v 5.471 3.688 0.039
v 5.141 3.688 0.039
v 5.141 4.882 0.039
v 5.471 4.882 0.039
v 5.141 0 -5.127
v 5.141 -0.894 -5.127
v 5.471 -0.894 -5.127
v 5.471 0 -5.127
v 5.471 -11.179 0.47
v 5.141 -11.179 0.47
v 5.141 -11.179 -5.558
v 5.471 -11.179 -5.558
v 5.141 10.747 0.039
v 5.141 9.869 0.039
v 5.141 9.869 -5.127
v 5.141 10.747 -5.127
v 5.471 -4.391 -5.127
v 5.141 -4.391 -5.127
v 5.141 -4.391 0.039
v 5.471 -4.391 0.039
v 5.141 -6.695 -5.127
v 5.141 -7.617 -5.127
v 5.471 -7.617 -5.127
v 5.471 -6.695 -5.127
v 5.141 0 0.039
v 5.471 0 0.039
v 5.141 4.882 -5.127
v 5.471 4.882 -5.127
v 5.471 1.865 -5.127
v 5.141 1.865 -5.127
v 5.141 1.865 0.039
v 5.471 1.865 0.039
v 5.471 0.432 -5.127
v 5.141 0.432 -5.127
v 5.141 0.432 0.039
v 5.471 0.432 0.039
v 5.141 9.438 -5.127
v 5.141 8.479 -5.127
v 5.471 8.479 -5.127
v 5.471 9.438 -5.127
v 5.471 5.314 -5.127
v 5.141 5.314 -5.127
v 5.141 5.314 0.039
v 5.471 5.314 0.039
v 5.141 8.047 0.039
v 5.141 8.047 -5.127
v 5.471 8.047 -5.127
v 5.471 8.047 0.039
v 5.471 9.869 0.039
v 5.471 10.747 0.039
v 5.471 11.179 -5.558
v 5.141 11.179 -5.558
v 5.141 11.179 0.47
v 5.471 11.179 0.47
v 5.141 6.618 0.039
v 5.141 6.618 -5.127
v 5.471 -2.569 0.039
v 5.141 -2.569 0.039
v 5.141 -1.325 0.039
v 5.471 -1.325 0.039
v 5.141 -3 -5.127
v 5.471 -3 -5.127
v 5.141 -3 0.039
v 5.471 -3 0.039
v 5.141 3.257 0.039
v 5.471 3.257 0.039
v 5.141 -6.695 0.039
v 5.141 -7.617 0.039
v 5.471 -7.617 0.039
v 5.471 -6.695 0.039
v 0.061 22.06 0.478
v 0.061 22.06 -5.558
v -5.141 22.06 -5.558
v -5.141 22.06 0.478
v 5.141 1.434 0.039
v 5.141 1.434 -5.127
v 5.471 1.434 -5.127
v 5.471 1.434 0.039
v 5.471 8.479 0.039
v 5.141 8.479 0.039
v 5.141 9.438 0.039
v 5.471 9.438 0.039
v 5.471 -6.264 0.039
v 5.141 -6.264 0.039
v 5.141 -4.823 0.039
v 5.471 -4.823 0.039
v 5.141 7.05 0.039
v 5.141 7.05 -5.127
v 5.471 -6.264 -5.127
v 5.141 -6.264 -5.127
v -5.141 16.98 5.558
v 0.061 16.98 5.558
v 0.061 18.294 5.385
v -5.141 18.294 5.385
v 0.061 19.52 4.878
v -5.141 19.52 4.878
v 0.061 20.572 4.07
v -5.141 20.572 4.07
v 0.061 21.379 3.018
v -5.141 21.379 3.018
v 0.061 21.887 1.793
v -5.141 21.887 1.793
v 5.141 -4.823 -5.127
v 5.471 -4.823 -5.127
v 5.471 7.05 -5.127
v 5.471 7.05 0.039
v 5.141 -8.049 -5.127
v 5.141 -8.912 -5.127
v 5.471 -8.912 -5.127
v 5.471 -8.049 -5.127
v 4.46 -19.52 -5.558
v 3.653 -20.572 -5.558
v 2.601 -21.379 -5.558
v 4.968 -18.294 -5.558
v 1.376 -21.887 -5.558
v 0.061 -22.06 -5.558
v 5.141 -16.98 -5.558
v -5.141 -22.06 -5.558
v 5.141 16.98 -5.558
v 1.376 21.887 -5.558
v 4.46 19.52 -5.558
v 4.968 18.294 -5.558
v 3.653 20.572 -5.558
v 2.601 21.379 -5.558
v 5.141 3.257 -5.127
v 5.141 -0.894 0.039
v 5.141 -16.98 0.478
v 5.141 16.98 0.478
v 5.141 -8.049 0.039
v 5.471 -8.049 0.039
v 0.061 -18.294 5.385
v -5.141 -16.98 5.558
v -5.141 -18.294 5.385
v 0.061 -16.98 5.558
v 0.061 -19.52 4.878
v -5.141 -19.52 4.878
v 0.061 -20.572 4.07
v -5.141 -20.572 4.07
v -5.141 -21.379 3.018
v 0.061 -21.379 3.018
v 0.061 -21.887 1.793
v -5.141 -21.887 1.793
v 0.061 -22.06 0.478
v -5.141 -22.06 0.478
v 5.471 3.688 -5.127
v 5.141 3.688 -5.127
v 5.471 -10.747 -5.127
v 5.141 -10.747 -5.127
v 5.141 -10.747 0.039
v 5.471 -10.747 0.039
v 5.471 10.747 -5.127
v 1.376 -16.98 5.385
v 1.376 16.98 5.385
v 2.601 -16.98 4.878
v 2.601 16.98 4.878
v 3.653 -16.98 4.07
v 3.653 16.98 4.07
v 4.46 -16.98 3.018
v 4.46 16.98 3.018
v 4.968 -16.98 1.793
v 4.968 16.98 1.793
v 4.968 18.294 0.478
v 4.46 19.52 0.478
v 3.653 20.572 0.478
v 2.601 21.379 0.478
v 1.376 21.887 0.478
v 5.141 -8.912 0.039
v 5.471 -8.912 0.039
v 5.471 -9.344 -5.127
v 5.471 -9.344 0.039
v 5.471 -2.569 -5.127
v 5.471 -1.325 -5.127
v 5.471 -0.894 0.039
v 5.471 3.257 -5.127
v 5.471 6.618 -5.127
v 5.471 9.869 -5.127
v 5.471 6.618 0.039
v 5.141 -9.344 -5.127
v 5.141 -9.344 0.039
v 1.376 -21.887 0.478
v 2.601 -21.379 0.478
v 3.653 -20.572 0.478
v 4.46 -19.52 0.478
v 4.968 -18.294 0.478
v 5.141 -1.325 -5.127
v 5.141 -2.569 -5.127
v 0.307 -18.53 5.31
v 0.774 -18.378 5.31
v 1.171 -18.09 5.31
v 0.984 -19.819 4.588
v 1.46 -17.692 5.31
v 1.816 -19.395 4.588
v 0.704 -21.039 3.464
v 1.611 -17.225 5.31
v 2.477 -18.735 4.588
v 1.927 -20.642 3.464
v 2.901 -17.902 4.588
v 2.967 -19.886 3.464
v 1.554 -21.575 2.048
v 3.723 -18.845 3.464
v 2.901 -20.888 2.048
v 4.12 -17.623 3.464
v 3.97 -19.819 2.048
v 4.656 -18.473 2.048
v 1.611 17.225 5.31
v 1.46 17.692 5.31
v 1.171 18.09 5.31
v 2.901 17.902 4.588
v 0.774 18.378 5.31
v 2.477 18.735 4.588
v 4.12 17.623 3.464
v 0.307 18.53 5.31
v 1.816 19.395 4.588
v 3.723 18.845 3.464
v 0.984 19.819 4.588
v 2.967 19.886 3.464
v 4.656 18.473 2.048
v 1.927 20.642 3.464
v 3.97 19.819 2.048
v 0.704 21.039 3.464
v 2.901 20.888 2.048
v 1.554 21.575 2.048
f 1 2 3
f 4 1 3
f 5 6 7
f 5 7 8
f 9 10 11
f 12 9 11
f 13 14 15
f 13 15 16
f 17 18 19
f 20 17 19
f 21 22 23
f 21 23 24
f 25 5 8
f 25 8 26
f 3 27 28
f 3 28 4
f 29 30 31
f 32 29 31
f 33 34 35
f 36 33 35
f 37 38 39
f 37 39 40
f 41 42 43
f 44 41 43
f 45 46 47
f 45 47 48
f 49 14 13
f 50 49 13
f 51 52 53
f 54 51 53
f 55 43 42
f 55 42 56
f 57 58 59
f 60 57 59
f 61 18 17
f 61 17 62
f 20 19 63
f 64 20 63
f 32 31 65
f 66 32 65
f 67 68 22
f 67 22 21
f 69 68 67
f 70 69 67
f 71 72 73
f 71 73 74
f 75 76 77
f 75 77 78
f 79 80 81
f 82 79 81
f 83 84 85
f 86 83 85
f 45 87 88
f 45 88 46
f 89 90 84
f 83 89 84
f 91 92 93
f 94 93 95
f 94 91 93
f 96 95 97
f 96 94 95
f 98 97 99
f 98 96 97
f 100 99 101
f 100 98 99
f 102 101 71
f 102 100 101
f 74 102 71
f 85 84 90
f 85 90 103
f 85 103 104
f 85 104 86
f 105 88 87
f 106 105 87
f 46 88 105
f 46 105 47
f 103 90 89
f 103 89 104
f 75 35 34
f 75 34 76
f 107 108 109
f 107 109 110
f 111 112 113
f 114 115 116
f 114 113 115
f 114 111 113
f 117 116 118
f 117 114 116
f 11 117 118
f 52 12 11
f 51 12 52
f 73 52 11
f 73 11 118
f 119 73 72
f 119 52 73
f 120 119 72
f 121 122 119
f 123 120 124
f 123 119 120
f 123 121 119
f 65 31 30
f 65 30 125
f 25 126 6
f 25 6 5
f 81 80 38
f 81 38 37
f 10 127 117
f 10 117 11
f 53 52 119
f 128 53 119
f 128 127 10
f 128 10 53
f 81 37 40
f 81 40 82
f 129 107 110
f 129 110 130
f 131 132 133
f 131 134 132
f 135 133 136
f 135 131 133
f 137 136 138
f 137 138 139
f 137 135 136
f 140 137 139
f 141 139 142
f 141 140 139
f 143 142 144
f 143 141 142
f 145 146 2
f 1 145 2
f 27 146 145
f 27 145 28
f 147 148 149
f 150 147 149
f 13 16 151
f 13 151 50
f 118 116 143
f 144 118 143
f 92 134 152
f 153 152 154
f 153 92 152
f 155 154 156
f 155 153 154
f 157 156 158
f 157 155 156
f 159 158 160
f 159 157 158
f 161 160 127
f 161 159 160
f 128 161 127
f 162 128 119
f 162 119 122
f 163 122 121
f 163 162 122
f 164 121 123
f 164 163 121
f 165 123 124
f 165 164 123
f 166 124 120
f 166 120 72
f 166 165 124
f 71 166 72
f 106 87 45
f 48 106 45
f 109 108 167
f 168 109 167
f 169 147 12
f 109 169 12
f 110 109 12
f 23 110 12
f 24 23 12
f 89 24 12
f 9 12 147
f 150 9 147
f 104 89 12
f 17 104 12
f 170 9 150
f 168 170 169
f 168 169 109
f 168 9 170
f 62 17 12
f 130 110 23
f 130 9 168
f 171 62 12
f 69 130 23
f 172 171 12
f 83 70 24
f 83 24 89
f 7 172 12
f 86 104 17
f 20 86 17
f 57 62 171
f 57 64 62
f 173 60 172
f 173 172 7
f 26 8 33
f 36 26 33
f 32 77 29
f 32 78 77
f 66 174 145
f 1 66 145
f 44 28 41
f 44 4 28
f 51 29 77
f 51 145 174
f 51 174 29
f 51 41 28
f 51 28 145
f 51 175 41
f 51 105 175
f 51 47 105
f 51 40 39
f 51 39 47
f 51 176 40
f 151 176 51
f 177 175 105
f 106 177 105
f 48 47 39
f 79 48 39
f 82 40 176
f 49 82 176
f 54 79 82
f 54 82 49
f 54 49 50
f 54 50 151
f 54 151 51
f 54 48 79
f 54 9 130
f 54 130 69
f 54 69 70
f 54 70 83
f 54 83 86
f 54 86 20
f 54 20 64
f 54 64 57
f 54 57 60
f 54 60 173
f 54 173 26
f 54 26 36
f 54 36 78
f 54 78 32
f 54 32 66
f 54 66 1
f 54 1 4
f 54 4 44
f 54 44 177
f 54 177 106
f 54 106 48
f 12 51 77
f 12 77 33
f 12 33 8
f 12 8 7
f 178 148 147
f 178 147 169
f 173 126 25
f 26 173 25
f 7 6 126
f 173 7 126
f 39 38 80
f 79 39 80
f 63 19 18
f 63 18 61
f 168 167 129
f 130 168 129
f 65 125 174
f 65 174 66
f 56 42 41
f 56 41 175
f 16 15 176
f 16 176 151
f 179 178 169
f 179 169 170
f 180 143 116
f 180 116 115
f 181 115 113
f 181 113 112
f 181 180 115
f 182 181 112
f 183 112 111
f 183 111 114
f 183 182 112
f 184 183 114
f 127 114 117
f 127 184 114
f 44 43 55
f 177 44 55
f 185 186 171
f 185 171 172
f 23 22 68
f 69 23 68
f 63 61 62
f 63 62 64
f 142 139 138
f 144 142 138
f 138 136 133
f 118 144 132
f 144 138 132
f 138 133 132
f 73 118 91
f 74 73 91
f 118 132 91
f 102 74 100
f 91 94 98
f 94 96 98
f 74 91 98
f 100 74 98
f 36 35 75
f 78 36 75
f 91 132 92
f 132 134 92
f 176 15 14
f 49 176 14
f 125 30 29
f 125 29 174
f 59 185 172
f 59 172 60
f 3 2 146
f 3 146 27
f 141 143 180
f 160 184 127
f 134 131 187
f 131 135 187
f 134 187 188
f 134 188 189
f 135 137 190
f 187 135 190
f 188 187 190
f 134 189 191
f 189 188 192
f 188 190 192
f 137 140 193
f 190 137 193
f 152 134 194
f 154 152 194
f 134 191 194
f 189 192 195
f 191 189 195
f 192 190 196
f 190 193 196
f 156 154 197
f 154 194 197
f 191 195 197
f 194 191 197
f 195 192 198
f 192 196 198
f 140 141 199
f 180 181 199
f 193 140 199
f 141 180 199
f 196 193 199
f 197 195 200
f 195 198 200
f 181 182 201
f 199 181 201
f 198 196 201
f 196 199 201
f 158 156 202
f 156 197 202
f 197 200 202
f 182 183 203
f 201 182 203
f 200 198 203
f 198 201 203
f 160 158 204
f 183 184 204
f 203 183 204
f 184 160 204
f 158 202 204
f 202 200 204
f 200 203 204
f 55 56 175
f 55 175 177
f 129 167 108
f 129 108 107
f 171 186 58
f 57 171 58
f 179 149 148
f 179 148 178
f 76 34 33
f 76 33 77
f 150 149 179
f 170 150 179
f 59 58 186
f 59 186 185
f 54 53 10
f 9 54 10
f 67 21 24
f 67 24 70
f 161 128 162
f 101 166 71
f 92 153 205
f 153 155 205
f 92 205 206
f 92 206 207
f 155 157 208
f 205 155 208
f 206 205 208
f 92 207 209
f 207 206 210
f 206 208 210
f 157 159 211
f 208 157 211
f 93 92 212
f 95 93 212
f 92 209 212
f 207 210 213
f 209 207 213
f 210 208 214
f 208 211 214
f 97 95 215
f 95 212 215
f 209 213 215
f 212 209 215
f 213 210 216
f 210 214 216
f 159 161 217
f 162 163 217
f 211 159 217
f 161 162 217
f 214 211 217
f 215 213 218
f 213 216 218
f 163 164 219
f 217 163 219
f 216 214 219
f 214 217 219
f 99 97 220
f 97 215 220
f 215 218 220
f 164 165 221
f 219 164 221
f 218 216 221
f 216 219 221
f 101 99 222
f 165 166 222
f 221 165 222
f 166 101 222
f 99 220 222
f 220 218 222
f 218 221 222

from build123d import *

# Parameters (mm, degrees)
F0_W     = 44.1192735617
F0_H     = 11.1166509635
F1_DEPTH = 5.14096
F2_R     = 5.08
F3_R     = 5.08
F4_W     = 1.4028784636
F4_H     = 5.165201461
F4_W_2   = 0.8638333529
F4_W_3   = 0.9213921431
F4_W_4   = 1.4403553497
F4_W_5   = 1.3910879198
F4_W_6   = 1.2432860676
F4_W_7   = 0.8935106736
F4_W_8   = 1.0018550383
F4_W_9   = 1.3910882691
F4_W_10  = 1.1940188706
F4_W_11  = 1.3041589975
F4_W_12  = 0.9969494123
F4_W_13  = 0.9587099776
F4_W_14  = 0.8777634058
F5_DEPTH = 0.3302


# Not quite as in the source:
# - a feature names something its author has since deleted; it is built from what else it names


with BuildPart() as f1:
    # F0 (on Right) → F1 (new body, symmetric)
    with BuildSketch(Plane.YZ):
        Rectangle(F0_W, F0_H)
    extrude(amount=F1_DEPTH, both=True)

    # F2
    f2_edges = [f1.edges().sort_by_distance(p)[0] for p in [
        (5.14096, 22.059637, 0),
        (5.14096, -22.059637, 0),
    ]]
    fillet(f2_edges, radius=F2_R)

    # F3
    f3_edges = [f1.edges().sort_by_distance(p)[0] for p in [
        (-2.54, 22.059637, 5.558325),
    ]]
    fillet(f3_edges, radius=F3_R)

    # F4 (on face) → F5 (join)
    with BuildSketch(Plane.YZ.offset(5.14096)):
        Polygon((9.4375805929, -5.5583254817), (11.1789442599, -5.5583254817), (11.1789442599, 0.4704763523), (8.4788706154, 0.4704763523), (7.0501212031, 0.4704763523), (4.8823622055, 0.4704763523), (3.2565433066, 0.4704763523), (1.4336550375, 0.4704763523), (0, 0.4704763523), (-1.3253106736, 0.4704763523), (-3.0003967695, 0.4704763523), (-4.8232846893, 0.4704763523), (-6.695440039, 0.4704763523), (-11.1789442599, 0.4704763523), (-11.1789442599, -5.5583254817), (-8.9124655351, -5.5583254817), (-6.695440039, -5.5583254817), (-4.8232846893, -5.5583254817), (-3.0003967695, -5.5583254817), (-1.3253106736, -5.5583254817), (0, -5.5583254817), (1.4336550375, -5.5583254817), (3.2565433066, -5.5583254817), (4.8823622055, -5.5583254817), (7.0501212031, -5.5583254817), (8.4788706154, -5.5583254817), align=None)
        with Locations((-10.0457047669, -2.5439243782)):
            Rectangle(F4_W, F4_H, mode=Mode.SUBTRACT)
        with Locations((-8.4805488586, -2.5439243782)):
            Rectangle(F4_W_2, F4_H, mode=Mode.SUBTRACT)
        with Locations((-7.1561361106, -2.5439243782)):
            Rectangle(F4_W_3, F4_H, mode=Mode.SUBTRACT)
        with Locations((-5.5434623642, -2.5439243782)):
            Rectangle(F4_W_4, F4_H, mode=Mode.SUBTRACT)
        with Locations((-3.6959407294, -2.5439243782)):
            Rectangle(F4_W_5, F4_H, mode=Mode.SUBTRACT)
        with Locations((-1.9469537074, -2.5439243782)):
            Rectangle(F4_W_6, F4_H, mode=Mode.SUBTRACT)
        with Locations((-0.4467553368, -2.5439243782)):
            Rectangle(F4_W_7, F4_H, mode=Mode.SUBTRACT)
        with Locations((0.9327275184, -2.5439243782)):
            Rectangle(F4_W_8, F4_H, mode=Mode.SUBTRACT)
        with Locations((2.5609991721, -2.5439243782)):
            Rectangle(F4_W_9, F4_H, mode=Mode.SUBTRACT)
        with Locations((4.2853527702, -2.5439243782)):
            Rectangle(F4_W_10, F4_H, mode=Mode.SUBTRACT)
        with Locations((5.9662417043, -2.5439243782)):
            Rectangle(F4_W_11, F4_H, mode=Mode.SUBTRACT)
        with Locations((7.5485959092, -2.5439243782)):
            Rectangle(F4_W_12, F4_H, mode=Mode.SUBTRACT)
        with Locations((8.9582256041, -2.5439243782)):
            Rectangle(F4_W_13, F4_H, mode=Mode.SUBTRACT)
        with Locations((10.3082622958, -2.5439243782)):
            Rectangle(F4_W_14, F4_H, mode=Mode.SUBTRACT)
    extrude(amount=F5_DEPTH)


solid = f1.part
